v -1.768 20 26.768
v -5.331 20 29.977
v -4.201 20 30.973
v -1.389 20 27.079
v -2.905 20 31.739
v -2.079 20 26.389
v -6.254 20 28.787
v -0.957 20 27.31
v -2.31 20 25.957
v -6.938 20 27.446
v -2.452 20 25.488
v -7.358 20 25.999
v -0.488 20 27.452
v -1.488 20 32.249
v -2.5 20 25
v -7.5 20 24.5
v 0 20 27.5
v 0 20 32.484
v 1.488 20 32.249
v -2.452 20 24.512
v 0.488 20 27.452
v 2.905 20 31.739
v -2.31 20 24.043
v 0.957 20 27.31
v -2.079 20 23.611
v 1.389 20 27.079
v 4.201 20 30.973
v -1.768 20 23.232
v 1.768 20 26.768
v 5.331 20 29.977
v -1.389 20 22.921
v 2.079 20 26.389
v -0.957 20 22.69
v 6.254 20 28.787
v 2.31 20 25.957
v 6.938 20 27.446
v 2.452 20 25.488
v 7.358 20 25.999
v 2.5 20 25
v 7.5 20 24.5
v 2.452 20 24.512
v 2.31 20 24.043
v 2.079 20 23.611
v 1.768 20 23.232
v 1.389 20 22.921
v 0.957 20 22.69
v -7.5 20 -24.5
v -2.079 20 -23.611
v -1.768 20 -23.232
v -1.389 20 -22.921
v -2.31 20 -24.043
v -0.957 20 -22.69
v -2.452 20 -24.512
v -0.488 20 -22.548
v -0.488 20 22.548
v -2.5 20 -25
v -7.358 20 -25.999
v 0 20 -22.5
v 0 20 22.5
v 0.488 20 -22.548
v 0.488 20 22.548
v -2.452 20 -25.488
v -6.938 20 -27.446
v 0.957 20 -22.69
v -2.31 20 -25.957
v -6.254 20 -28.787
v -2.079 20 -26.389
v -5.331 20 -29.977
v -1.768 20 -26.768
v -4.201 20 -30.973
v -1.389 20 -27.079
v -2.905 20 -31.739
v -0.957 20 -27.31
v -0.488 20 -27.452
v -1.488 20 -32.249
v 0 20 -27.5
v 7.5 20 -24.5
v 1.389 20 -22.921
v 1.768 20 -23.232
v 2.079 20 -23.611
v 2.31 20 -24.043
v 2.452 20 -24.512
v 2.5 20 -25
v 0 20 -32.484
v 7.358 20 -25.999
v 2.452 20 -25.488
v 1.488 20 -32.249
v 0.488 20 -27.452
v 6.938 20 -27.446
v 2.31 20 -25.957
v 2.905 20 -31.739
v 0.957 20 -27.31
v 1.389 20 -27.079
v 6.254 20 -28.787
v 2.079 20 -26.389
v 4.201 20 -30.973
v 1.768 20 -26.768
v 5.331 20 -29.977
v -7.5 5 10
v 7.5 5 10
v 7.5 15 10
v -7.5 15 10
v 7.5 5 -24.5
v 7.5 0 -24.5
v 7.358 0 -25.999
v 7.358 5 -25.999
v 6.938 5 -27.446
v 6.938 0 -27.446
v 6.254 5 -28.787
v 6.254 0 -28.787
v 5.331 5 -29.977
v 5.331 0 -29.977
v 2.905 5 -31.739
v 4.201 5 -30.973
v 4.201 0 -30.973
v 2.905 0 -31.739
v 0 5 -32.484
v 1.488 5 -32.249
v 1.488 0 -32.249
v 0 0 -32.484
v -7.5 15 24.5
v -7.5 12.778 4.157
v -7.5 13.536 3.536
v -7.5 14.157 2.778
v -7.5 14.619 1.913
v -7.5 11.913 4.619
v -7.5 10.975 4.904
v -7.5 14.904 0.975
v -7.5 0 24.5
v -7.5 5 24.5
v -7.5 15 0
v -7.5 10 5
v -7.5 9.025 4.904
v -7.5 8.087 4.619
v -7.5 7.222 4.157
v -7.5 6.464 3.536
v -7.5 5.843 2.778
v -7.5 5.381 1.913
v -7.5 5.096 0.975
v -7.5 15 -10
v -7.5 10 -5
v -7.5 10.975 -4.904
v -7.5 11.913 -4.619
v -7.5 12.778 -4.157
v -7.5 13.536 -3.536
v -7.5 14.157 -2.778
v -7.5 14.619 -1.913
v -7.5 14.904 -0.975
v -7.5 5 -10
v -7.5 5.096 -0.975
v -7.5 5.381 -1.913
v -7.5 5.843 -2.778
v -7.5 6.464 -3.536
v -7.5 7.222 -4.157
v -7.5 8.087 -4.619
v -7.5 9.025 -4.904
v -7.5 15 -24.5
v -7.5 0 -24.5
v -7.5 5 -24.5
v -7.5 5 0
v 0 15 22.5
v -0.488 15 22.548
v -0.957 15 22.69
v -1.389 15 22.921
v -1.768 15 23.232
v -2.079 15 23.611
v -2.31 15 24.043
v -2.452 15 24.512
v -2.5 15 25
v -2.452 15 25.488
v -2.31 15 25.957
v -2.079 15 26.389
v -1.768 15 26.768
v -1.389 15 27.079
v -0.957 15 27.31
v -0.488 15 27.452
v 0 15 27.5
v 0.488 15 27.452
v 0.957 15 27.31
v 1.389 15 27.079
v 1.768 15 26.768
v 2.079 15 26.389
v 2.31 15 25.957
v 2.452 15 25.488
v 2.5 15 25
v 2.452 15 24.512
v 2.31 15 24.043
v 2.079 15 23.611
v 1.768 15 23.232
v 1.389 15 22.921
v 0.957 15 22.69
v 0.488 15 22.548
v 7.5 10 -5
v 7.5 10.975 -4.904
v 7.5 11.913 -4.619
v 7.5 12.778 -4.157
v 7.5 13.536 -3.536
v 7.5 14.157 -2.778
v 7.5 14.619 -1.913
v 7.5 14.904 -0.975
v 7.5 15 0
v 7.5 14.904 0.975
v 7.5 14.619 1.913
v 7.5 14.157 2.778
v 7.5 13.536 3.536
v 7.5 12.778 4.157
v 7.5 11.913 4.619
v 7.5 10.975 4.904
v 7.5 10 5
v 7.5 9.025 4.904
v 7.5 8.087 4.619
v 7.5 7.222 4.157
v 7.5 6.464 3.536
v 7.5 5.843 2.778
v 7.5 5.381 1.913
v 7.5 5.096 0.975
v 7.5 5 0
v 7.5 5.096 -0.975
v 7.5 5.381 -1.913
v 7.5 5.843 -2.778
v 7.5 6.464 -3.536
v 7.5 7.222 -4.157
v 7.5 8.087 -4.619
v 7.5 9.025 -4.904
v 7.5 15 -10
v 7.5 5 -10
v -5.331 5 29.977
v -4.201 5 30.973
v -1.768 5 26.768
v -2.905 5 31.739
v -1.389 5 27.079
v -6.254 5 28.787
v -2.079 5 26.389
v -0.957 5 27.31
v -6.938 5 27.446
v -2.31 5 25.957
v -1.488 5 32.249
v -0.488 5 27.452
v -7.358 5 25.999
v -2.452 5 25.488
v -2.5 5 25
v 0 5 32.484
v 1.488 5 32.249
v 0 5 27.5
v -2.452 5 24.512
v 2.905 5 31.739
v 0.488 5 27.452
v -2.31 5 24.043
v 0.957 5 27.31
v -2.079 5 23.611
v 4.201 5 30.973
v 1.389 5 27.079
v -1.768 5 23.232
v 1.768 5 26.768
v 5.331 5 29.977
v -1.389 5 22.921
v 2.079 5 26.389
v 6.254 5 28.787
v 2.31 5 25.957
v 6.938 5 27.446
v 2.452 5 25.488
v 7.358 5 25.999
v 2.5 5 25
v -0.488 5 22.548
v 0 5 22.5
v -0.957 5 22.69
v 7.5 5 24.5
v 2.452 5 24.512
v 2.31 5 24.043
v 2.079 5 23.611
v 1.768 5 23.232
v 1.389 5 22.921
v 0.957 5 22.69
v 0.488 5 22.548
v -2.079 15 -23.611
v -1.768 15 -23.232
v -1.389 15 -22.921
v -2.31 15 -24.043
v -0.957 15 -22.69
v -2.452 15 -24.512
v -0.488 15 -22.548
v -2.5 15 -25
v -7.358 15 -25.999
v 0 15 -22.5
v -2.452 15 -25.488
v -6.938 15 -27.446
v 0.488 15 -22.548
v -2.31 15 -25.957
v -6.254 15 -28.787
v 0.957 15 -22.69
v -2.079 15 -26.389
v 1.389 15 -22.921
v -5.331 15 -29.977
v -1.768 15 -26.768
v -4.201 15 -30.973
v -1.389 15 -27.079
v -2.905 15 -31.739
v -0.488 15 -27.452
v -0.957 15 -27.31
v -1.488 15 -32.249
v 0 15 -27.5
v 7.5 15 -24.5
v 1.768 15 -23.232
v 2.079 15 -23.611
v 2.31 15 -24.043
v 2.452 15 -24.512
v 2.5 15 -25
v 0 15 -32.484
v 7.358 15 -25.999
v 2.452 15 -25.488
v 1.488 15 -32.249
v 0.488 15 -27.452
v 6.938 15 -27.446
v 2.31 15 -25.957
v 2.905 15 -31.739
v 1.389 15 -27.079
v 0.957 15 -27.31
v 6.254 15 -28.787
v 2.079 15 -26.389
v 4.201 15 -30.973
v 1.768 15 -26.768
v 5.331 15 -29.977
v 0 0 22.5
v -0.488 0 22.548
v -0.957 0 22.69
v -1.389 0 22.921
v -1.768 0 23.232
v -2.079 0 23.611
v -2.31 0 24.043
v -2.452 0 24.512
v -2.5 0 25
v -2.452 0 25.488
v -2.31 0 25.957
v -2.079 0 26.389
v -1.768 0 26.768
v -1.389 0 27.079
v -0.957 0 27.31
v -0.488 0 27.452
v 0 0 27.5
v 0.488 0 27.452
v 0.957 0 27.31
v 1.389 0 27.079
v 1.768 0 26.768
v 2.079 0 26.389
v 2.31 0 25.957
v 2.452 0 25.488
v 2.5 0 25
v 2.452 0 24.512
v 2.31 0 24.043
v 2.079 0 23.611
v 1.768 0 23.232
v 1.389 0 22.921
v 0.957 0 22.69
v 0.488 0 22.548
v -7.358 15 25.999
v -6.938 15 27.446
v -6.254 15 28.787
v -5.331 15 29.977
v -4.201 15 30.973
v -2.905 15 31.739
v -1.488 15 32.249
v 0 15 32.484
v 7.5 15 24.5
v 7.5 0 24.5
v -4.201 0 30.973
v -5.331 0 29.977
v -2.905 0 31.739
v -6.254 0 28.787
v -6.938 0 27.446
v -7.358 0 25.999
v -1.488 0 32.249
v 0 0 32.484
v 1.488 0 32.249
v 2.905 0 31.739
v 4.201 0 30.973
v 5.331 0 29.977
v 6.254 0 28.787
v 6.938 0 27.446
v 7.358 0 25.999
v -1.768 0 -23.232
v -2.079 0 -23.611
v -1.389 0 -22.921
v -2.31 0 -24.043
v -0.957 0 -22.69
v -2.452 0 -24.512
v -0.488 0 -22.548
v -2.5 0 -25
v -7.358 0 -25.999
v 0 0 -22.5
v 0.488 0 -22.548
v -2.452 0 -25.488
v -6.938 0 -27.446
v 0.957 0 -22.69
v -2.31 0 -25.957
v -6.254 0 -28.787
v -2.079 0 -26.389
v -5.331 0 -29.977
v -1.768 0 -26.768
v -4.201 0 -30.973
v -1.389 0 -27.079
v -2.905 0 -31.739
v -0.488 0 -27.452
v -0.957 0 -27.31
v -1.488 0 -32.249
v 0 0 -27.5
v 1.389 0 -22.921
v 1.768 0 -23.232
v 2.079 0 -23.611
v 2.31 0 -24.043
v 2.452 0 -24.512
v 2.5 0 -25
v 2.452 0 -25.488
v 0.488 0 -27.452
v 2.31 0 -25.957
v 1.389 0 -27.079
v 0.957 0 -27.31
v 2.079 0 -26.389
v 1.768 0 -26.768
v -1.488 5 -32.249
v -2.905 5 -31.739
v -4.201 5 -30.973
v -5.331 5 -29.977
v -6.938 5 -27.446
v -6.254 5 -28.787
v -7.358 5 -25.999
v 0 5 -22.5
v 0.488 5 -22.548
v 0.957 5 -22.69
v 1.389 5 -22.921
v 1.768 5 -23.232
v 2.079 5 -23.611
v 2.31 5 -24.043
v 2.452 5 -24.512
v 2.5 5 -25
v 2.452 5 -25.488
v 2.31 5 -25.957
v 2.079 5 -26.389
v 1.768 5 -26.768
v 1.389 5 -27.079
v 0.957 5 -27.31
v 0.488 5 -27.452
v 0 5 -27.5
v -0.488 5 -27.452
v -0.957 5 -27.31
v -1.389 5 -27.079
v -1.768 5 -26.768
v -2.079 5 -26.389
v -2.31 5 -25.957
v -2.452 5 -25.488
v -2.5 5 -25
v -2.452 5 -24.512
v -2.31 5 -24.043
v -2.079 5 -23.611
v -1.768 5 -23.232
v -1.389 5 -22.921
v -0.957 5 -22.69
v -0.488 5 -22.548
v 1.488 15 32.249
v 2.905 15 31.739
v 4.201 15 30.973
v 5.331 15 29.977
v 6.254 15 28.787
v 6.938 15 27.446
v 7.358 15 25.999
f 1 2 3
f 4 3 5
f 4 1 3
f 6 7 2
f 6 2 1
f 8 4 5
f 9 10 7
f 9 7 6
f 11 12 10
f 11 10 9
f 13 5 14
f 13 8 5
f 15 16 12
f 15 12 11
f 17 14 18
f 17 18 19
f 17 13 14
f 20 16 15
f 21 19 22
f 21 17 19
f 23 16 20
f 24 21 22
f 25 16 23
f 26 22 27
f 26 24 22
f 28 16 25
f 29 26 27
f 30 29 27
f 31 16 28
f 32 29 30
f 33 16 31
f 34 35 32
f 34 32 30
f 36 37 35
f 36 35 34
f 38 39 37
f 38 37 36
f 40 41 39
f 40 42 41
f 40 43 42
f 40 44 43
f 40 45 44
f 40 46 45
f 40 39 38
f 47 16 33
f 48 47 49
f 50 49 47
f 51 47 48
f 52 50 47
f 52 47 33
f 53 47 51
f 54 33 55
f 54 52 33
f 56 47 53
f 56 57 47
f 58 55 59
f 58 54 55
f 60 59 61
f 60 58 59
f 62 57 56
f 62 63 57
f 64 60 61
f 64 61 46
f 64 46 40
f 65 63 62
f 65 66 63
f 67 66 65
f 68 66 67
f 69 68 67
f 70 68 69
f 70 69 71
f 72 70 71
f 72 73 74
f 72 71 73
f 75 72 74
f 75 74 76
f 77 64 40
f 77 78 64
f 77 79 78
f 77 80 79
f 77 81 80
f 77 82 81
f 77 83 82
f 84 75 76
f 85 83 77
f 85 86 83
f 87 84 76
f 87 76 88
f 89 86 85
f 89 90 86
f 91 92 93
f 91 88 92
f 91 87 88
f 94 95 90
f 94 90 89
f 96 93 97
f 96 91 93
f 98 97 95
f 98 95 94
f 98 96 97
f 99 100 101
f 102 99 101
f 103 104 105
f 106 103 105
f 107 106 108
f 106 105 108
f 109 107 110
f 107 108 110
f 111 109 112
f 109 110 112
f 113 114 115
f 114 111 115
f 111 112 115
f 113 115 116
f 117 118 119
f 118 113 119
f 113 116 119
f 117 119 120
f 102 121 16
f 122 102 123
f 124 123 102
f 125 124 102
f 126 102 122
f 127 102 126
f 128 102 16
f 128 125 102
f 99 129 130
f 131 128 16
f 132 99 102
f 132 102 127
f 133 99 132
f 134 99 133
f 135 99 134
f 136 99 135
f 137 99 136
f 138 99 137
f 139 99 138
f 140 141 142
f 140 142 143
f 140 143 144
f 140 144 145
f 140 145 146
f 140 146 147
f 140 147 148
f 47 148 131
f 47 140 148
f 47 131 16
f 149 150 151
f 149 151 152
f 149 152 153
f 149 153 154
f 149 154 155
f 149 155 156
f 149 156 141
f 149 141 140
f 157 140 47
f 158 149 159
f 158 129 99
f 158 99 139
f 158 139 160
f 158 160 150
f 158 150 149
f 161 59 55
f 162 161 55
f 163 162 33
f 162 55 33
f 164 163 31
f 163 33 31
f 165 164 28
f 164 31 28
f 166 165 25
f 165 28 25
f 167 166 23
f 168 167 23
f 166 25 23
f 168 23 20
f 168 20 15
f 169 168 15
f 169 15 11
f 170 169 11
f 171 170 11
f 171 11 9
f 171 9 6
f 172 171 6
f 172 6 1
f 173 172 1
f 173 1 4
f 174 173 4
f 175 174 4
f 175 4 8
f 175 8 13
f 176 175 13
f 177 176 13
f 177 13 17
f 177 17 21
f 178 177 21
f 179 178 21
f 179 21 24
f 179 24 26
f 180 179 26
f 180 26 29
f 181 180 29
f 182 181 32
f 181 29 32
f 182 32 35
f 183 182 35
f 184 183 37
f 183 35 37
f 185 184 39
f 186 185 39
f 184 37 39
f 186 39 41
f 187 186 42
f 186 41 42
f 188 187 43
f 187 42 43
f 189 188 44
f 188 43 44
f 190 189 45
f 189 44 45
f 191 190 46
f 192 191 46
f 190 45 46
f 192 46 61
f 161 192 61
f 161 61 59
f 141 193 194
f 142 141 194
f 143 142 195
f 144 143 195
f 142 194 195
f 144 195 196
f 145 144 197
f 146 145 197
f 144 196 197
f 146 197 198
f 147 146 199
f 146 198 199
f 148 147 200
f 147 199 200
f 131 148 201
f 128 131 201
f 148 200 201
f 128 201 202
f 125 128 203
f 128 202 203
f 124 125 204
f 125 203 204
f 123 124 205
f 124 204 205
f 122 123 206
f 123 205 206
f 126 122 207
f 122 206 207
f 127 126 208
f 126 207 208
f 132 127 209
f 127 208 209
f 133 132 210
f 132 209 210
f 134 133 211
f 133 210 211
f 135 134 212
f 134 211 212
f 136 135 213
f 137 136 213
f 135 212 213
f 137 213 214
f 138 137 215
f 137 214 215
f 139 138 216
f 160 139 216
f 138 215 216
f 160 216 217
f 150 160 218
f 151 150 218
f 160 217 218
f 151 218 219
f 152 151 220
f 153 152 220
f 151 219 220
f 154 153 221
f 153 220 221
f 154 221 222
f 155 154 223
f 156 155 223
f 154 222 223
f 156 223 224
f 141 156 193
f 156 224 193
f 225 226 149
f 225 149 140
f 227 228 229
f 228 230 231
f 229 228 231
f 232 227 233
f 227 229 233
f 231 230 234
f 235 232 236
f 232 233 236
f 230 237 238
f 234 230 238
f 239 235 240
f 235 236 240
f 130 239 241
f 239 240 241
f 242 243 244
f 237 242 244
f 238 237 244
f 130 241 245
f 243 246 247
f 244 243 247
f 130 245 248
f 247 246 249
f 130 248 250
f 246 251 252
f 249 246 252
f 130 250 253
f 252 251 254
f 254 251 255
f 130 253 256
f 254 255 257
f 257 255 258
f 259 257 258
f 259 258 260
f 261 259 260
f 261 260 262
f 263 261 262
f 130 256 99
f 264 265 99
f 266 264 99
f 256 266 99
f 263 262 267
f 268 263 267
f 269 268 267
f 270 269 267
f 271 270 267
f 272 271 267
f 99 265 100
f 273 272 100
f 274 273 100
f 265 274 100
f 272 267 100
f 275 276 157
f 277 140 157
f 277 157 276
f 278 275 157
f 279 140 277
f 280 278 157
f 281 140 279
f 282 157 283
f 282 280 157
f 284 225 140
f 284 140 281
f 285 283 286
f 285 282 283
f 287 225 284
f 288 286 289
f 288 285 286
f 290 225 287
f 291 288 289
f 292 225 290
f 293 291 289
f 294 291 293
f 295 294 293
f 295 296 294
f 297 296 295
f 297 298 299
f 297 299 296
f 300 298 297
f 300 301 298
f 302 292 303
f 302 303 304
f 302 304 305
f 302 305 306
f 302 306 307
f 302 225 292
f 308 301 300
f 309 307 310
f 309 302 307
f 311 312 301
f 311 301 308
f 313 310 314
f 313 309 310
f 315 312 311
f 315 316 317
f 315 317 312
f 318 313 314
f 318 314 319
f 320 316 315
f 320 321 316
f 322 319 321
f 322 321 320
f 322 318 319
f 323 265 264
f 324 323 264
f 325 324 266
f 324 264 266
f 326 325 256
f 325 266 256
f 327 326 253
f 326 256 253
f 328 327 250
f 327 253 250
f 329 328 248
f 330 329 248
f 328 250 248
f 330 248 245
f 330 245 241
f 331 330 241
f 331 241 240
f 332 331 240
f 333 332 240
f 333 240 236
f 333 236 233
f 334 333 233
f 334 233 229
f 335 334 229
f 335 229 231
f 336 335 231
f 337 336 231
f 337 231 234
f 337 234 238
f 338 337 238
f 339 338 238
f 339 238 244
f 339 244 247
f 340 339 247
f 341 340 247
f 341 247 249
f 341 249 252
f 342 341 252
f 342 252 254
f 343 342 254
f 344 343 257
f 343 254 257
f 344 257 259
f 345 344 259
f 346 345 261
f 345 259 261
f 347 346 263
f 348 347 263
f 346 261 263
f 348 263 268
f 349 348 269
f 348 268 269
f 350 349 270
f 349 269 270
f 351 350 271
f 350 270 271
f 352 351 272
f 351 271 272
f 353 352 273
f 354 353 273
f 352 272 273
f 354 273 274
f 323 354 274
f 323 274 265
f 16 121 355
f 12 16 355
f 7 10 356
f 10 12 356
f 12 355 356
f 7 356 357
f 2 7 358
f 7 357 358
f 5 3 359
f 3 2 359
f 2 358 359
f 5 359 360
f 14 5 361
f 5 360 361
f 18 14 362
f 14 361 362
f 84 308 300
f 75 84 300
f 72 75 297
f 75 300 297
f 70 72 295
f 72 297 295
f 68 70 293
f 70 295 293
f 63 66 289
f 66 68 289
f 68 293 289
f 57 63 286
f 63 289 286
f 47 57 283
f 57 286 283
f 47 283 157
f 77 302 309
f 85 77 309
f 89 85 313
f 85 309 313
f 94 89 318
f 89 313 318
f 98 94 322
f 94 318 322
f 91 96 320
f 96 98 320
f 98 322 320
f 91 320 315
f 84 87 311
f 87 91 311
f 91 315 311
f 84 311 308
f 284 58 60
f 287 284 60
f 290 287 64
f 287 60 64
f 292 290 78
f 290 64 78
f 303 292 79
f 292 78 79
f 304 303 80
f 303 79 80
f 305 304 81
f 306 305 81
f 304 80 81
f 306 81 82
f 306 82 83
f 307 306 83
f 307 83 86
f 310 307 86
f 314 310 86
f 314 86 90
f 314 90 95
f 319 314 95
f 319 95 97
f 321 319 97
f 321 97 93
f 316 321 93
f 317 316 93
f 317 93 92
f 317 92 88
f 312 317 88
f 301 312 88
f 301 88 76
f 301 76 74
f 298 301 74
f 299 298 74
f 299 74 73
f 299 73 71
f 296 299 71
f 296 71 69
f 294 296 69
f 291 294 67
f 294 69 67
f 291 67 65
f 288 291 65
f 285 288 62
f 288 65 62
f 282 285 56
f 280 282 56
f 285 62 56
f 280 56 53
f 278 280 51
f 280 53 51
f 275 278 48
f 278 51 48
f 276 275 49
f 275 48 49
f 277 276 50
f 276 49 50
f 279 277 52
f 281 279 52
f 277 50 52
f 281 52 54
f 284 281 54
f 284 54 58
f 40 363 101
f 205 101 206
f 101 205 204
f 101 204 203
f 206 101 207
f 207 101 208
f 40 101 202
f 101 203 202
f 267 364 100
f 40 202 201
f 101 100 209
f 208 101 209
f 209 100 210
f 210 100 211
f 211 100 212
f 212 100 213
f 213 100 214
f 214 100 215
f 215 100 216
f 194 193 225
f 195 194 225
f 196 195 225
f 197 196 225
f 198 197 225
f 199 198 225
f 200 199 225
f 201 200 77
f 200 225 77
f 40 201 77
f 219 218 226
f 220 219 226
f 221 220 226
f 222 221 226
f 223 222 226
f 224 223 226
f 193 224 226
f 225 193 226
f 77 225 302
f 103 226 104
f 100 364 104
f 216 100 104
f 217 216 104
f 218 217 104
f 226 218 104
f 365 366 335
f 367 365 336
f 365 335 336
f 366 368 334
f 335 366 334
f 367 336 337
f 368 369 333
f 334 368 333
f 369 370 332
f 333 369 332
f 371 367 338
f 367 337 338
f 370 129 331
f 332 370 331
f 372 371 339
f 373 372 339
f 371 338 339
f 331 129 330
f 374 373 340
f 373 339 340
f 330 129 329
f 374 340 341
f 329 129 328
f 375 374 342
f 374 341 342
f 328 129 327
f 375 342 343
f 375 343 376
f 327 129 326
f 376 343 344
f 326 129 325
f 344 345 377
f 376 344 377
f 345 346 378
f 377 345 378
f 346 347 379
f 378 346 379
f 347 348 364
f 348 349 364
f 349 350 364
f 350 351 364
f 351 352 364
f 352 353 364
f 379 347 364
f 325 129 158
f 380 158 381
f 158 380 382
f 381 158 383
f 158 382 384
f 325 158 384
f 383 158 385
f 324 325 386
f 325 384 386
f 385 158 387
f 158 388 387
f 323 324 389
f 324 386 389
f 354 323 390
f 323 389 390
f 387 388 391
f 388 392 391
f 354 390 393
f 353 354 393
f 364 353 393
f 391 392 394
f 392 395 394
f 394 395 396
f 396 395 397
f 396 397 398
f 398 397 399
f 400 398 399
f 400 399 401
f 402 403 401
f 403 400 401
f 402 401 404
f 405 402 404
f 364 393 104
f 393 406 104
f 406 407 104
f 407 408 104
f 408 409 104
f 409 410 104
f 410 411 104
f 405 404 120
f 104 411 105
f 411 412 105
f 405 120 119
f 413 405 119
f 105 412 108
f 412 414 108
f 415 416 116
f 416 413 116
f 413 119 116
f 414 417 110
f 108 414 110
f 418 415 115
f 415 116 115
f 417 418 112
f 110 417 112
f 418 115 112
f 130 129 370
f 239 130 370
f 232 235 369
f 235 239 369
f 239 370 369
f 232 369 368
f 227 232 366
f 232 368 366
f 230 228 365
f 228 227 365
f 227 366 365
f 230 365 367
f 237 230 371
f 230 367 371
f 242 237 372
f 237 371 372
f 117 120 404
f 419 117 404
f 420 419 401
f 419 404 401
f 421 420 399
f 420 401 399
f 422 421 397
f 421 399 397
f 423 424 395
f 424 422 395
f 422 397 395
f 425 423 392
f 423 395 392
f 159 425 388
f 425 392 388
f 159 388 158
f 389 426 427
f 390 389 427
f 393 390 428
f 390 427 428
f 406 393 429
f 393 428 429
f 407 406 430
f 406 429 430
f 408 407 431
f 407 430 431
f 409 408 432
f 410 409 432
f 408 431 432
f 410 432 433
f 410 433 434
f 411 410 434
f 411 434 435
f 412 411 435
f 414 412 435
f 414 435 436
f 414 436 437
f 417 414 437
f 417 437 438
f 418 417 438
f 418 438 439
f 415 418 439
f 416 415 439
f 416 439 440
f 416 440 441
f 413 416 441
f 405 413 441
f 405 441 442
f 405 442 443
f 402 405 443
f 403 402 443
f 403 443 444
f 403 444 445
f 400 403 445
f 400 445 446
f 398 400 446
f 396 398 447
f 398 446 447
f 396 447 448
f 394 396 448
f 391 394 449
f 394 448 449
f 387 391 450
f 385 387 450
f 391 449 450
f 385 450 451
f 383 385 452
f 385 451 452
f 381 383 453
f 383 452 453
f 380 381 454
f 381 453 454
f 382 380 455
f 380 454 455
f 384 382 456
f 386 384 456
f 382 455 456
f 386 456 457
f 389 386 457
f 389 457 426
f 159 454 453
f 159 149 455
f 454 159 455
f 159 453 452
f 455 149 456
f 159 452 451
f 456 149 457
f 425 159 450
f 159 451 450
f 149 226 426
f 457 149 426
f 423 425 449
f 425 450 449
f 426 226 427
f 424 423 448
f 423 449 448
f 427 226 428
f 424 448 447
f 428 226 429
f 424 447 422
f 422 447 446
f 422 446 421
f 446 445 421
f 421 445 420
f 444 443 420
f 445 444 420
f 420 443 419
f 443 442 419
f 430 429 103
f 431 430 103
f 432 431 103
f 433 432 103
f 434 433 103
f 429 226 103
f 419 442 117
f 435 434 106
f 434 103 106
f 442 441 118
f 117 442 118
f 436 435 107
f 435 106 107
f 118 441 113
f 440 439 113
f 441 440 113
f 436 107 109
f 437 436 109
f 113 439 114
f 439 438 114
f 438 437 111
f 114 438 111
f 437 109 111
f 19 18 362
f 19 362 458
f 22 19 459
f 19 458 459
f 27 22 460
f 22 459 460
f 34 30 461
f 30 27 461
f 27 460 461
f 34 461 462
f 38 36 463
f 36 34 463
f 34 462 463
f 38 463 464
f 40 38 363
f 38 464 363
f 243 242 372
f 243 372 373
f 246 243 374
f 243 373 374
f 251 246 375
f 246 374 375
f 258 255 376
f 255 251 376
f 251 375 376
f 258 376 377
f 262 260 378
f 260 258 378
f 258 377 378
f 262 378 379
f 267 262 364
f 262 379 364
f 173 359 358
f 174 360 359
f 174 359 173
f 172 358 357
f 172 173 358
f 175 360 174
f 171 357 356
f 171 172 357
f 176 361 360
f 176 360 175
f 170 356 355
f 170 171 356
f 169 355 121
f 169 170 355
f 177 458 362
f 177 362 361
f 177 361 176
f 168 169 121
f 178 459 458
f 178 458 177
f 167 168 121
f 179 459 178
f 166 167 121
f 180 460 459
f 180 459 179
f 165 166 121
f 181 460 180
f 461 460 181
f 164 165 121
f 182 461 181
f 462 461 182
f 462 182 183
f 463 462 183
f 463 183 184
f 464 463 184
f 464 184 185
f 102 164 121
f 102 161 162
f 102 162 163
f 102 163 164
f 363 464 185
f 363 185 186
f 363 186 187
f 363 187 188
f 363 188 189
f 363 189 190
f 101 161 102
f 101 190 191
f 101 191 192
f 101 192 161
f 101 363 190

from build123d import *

# Parameters (mm, degrees)
SKETCH1_W           = 15
SKETCH1_H           = 65
BOSS_EXTRUDE1_DEPTH = 20
SKETCH2_R           = 2.5
CUT_EXTRUDE1_DEPTH  = 20
SKETCH6_R           = 5
CUT_EXTRUDE3_DEPTH  = 15
SKETCH7_W           = 22.5
SKETCH7_H           = 5
SKETCH7_H_2         = 10
CUT_EXTRUDE4_DEPTH  = 15
FILLET3_R           = 8


with BuildPart() as part:
    # Sketch1 → Boss-Extrude1 (new body)
    with BuildSketch(Plane(origin=(0, 0, 0), x_dir=(1, 0, 0), z_dir=(0, 1, 0))):
        Rectangle(SKETCH1_W, SKETCH1_H)
    extrude(amount=BOSS_EXTRUDE1_DEPTH)

    # Sketch2 → Cut-Extrude1 (cut)
    with BuildSketch(Plane(origin=(0, 20, 0), x_dir=(1, 0, 0), z_dir=(0, 1, 0))):
        with Locations(Location((0, 25, 0), (0, 0, 270))):
            Circle(SKETCH2_R)
        with Locations(Location((0, -25, 0), (0, 0, 90))):
            Circle(SKETCH2_R)
    extrude(amount=-CUT_EXTRUDE1_DEPTH, mode=Mode.SUBTRACT)

    # Sketch6 → Cut-Extrude3 (cut)
    with BuildSketch(Plane(origin=(7.5, 0, 0), x_dir=(0, 0, -1), z_dir=(1, 0, 0))):
        with Locations((0, 10)):
            Circle(SKETCH6_R)
    extrude(amount=-CUT_EXTRUDE3_DEPTH, mode=Mode.SUBTRACT)

    # Sketch7 → Cut-Extrude4 (cut)
    with BuildSketch(Plane(origin=(7.5, 0, 0), x_dir=(0, 0, -1), z_dir=(1, 0, 0))):
        with Locations((-21.25, 12.5)):
            Rectangle(SKETCH7_W, SKETCH7_H)
        with Locations((-21.25, 7.5)):
            Rectangle(SKETCH7_W, SKETCH7_H)
        with Locations((21.25, 10)):
            Rectangle(SKETCH7_W, SKETCH7_H_2)
    extrude(amount=-CUT_EXTRUDE4_DEPTH, mode=Mode.SUBTRACT)

    # Fillet3
    # the kernel refuses this fillet: 8 mm, written as the material it takes off along each edge
    with BuildSketch(Plane(origin=(-7.5, -20, 32.5), x_dir=(1, 0, 0), z_dir=(0, 1, 0)), Plane(origin=(-7.5, -20, -32.5), x_dir=(0, 0, 1), z_dir=(0, 1, 0)), Plane(origin=(-7.5, -5, -32.5), x_dir=(0, 0, 1), z_dir=(0, 1, 0)), Plane(origin=(7.5, -5, 32.5), x_dir=(0, 0, -1), z_dir=(0, 1, 0))) as fillet3_piece_1:
        with BuildLine():
            CenterArc((FILLET3_R, FILLET3_R), FILLET3_R, 180, 90)
            Line((0, FILLET3_R), (0, 0))
            Line((0, 0), (FILLET3_R, 0))
        make_face()
    extrude(amount=45, mode=Mode.SUBTRACT)
    with BuildSketch(Plane(origin=(7.5, -20, 32.5), x_dir=(-1, 0, 0), z_dir=(0, 1, 0)), Plane(origin=(7.5, -20, -32.5), x_dir=(0, 0, 1), z_dir=(0, 1, 0)), Plane(origin=(7.5, -5, -32.5), x_dir=(0, 0, 1), z_dir=(0, 1, 0)), Plane(origin=(-7.5, -5, 32.5), x_dir=(0, 0, -1), z_dir=(0, 1, 0))) as fillet3_piece_2:
        with BuildLine():
            CenterArc((FILLET3_R, -FILLET3_R), FILLET3_R, 90, 90)
            Line((0, -FILLET3_R), (0, 0))
            Line((0, 0), (FILLET3_R, 0))
        make_face()
    extrude(amount=45, mode=Mode.SUBTRACT)


solid = part.part
